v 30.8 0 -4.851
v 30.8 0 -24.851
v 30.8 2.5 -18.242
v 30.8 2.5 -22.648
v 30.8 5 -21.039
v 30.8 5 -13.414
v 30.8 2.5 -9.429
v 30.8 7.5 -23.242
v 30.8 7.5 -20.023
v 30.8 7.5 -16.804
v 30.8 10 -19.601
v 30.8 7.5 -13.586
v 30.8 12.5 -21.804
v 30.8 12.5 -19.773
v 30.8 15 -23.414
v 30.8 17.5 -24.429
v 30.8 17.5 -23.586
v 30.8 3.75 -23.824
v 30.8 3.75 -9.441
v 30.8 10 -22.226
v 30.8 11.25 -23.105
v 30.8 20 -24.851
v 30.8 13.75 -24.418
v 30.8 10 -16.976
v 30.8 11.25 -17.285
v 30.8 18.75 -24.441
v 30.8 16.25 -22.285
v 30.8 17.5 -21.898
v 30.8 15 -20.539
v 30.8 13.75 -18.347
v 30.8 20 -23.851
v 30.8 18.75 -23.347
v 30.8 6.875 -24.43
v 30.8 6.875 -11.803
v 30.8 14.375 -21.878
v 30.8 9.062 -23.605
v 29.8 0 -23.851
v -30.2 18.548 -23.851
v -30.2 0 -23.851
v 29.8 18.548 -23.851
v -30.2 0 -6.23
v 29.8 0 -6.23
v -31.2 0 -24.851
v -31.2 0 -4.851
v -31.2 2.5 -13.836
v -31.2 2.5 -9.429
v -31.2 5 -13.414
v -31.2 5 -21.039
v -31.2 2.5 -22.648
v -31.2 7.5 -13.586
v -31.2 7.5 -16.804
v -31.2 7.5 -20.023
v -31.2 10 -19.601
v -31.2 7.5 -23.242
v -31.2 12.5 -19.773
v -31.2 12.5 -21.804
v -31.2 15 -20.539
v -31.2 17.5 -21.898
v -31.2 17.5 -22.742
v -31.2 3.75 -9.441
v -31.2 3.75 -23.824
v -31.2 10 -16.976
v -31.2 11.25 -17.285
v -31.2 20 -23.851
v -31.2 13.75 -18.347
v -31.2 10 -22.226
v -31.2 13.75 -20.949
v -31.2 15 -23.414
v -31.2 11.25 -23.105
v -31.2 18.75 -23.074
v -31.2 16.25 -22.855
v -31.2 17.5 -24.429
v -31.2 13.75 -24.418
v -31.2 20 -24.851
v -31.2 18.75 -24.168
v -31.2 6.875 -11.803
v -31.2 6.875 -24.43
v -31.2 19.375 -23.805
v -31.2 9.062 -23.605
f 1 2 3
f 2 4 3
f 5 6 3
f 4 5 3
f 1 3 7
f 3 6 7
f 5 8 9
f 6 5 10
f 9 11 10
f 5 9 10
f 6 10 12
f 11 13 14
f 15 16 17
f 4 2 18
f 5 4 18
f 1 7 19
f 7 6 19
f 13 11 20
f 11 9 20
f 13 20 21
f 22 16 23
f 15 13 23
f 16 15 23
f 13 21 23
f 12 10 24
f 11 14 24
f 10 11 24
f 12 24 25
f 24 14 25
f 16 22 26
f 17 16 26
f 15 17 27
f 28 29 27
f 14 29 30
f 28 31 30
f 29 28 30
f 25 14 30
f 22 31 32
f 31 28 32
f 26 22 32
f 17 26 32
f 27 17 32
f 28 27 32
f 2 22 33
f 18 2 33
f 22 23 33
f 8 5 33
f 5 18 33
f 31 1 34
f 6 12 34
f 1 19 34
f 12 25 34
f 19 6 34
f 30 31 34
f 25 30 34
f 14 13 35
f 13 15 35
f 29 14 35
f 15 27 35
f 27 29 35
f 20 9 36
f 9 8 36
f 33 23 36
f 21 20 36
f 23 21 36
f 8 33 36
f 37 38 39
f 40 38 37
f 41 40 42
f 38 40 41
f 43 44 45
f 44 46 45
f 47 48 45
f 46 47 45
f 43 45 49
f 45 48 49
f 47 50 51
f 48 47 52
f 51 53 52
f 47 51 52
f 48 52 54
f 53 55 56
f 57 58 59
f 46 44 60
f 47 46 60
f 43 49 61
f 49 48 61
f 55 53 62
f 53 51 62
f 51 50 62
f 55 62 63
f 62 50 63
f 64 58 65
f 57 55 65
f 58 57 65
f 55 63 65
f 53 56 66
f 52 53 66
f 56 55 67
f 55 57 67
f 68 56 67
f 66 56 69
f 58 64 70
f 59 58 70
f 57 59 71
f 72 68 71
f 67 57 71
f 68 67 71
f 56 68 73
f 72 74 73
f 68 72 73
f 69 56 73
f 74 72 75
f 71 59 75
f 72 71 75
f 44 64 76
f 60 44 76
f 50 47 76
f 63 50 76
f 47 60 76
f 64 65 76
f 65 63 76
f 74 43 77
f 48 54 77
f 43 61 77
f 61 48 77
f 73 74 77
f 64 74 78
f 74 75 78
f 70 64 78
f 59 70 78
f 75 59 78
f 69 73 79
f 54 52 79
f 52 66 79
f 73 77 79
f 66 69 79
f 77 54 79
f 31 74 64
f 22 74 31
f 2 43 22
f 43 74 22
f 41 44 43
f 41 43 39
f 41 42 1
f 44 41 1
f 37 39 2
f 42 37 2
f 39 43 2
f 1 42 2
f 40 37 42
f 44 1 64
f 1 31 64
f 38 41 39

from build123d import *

# Parameters (mm, degrees)
SHELL1_T = -1


with BuildPart() as part:
    # Sketch1 → Loft2 section 0
    with BuildSketch(Plane(origin=(0, 0, 0), x_dir=(1, 0, 0), z_dir=(0, 1, 0))):
        with BuildLine():
            Line((-31.199529688, 24.851146384), (30.800470312, 24.851146384))
            Line((30.800470312, 24.851146384), (30.800470312, 4.851146384))
            Line((30.800470312, 4.851146384), (-31.199529688, 4.851146384))
            Line((-31.199529688, 4.851146384), (-31.199529688, 24.851146384))
        make_face()
    # Sketch2 → Loft2 section 1
    with BuildSketch(Plane(origin=(0, 20, 0), x_dir=(1, 0, 0), z_dir=(0, 1, 0))):
        with BuildLine():
            Line((-31.199529688, 24.851146384), (30.800470312, 24.851146384))
            Line((30.800470312, 24.851146384), (30.800470312, 23.851146384))
            Line((30.800470312, 23.851146384), (-31.199529688, 23.851146384))
            Line((-31.199529688, 23.851146384), (-31.199529688, 24.851146384))
        make_face()
    loft()

    # Shell1
    shell1_openings = [part.faces().sort_by_distance(p)[0] for p in [
        (-0.199529688, 0, -14.851146384),
    ]]
    offset(amount=SHELL1_T, openings=shell1_openings, kind=Kind.INTERSECTION)


solid = part.part
